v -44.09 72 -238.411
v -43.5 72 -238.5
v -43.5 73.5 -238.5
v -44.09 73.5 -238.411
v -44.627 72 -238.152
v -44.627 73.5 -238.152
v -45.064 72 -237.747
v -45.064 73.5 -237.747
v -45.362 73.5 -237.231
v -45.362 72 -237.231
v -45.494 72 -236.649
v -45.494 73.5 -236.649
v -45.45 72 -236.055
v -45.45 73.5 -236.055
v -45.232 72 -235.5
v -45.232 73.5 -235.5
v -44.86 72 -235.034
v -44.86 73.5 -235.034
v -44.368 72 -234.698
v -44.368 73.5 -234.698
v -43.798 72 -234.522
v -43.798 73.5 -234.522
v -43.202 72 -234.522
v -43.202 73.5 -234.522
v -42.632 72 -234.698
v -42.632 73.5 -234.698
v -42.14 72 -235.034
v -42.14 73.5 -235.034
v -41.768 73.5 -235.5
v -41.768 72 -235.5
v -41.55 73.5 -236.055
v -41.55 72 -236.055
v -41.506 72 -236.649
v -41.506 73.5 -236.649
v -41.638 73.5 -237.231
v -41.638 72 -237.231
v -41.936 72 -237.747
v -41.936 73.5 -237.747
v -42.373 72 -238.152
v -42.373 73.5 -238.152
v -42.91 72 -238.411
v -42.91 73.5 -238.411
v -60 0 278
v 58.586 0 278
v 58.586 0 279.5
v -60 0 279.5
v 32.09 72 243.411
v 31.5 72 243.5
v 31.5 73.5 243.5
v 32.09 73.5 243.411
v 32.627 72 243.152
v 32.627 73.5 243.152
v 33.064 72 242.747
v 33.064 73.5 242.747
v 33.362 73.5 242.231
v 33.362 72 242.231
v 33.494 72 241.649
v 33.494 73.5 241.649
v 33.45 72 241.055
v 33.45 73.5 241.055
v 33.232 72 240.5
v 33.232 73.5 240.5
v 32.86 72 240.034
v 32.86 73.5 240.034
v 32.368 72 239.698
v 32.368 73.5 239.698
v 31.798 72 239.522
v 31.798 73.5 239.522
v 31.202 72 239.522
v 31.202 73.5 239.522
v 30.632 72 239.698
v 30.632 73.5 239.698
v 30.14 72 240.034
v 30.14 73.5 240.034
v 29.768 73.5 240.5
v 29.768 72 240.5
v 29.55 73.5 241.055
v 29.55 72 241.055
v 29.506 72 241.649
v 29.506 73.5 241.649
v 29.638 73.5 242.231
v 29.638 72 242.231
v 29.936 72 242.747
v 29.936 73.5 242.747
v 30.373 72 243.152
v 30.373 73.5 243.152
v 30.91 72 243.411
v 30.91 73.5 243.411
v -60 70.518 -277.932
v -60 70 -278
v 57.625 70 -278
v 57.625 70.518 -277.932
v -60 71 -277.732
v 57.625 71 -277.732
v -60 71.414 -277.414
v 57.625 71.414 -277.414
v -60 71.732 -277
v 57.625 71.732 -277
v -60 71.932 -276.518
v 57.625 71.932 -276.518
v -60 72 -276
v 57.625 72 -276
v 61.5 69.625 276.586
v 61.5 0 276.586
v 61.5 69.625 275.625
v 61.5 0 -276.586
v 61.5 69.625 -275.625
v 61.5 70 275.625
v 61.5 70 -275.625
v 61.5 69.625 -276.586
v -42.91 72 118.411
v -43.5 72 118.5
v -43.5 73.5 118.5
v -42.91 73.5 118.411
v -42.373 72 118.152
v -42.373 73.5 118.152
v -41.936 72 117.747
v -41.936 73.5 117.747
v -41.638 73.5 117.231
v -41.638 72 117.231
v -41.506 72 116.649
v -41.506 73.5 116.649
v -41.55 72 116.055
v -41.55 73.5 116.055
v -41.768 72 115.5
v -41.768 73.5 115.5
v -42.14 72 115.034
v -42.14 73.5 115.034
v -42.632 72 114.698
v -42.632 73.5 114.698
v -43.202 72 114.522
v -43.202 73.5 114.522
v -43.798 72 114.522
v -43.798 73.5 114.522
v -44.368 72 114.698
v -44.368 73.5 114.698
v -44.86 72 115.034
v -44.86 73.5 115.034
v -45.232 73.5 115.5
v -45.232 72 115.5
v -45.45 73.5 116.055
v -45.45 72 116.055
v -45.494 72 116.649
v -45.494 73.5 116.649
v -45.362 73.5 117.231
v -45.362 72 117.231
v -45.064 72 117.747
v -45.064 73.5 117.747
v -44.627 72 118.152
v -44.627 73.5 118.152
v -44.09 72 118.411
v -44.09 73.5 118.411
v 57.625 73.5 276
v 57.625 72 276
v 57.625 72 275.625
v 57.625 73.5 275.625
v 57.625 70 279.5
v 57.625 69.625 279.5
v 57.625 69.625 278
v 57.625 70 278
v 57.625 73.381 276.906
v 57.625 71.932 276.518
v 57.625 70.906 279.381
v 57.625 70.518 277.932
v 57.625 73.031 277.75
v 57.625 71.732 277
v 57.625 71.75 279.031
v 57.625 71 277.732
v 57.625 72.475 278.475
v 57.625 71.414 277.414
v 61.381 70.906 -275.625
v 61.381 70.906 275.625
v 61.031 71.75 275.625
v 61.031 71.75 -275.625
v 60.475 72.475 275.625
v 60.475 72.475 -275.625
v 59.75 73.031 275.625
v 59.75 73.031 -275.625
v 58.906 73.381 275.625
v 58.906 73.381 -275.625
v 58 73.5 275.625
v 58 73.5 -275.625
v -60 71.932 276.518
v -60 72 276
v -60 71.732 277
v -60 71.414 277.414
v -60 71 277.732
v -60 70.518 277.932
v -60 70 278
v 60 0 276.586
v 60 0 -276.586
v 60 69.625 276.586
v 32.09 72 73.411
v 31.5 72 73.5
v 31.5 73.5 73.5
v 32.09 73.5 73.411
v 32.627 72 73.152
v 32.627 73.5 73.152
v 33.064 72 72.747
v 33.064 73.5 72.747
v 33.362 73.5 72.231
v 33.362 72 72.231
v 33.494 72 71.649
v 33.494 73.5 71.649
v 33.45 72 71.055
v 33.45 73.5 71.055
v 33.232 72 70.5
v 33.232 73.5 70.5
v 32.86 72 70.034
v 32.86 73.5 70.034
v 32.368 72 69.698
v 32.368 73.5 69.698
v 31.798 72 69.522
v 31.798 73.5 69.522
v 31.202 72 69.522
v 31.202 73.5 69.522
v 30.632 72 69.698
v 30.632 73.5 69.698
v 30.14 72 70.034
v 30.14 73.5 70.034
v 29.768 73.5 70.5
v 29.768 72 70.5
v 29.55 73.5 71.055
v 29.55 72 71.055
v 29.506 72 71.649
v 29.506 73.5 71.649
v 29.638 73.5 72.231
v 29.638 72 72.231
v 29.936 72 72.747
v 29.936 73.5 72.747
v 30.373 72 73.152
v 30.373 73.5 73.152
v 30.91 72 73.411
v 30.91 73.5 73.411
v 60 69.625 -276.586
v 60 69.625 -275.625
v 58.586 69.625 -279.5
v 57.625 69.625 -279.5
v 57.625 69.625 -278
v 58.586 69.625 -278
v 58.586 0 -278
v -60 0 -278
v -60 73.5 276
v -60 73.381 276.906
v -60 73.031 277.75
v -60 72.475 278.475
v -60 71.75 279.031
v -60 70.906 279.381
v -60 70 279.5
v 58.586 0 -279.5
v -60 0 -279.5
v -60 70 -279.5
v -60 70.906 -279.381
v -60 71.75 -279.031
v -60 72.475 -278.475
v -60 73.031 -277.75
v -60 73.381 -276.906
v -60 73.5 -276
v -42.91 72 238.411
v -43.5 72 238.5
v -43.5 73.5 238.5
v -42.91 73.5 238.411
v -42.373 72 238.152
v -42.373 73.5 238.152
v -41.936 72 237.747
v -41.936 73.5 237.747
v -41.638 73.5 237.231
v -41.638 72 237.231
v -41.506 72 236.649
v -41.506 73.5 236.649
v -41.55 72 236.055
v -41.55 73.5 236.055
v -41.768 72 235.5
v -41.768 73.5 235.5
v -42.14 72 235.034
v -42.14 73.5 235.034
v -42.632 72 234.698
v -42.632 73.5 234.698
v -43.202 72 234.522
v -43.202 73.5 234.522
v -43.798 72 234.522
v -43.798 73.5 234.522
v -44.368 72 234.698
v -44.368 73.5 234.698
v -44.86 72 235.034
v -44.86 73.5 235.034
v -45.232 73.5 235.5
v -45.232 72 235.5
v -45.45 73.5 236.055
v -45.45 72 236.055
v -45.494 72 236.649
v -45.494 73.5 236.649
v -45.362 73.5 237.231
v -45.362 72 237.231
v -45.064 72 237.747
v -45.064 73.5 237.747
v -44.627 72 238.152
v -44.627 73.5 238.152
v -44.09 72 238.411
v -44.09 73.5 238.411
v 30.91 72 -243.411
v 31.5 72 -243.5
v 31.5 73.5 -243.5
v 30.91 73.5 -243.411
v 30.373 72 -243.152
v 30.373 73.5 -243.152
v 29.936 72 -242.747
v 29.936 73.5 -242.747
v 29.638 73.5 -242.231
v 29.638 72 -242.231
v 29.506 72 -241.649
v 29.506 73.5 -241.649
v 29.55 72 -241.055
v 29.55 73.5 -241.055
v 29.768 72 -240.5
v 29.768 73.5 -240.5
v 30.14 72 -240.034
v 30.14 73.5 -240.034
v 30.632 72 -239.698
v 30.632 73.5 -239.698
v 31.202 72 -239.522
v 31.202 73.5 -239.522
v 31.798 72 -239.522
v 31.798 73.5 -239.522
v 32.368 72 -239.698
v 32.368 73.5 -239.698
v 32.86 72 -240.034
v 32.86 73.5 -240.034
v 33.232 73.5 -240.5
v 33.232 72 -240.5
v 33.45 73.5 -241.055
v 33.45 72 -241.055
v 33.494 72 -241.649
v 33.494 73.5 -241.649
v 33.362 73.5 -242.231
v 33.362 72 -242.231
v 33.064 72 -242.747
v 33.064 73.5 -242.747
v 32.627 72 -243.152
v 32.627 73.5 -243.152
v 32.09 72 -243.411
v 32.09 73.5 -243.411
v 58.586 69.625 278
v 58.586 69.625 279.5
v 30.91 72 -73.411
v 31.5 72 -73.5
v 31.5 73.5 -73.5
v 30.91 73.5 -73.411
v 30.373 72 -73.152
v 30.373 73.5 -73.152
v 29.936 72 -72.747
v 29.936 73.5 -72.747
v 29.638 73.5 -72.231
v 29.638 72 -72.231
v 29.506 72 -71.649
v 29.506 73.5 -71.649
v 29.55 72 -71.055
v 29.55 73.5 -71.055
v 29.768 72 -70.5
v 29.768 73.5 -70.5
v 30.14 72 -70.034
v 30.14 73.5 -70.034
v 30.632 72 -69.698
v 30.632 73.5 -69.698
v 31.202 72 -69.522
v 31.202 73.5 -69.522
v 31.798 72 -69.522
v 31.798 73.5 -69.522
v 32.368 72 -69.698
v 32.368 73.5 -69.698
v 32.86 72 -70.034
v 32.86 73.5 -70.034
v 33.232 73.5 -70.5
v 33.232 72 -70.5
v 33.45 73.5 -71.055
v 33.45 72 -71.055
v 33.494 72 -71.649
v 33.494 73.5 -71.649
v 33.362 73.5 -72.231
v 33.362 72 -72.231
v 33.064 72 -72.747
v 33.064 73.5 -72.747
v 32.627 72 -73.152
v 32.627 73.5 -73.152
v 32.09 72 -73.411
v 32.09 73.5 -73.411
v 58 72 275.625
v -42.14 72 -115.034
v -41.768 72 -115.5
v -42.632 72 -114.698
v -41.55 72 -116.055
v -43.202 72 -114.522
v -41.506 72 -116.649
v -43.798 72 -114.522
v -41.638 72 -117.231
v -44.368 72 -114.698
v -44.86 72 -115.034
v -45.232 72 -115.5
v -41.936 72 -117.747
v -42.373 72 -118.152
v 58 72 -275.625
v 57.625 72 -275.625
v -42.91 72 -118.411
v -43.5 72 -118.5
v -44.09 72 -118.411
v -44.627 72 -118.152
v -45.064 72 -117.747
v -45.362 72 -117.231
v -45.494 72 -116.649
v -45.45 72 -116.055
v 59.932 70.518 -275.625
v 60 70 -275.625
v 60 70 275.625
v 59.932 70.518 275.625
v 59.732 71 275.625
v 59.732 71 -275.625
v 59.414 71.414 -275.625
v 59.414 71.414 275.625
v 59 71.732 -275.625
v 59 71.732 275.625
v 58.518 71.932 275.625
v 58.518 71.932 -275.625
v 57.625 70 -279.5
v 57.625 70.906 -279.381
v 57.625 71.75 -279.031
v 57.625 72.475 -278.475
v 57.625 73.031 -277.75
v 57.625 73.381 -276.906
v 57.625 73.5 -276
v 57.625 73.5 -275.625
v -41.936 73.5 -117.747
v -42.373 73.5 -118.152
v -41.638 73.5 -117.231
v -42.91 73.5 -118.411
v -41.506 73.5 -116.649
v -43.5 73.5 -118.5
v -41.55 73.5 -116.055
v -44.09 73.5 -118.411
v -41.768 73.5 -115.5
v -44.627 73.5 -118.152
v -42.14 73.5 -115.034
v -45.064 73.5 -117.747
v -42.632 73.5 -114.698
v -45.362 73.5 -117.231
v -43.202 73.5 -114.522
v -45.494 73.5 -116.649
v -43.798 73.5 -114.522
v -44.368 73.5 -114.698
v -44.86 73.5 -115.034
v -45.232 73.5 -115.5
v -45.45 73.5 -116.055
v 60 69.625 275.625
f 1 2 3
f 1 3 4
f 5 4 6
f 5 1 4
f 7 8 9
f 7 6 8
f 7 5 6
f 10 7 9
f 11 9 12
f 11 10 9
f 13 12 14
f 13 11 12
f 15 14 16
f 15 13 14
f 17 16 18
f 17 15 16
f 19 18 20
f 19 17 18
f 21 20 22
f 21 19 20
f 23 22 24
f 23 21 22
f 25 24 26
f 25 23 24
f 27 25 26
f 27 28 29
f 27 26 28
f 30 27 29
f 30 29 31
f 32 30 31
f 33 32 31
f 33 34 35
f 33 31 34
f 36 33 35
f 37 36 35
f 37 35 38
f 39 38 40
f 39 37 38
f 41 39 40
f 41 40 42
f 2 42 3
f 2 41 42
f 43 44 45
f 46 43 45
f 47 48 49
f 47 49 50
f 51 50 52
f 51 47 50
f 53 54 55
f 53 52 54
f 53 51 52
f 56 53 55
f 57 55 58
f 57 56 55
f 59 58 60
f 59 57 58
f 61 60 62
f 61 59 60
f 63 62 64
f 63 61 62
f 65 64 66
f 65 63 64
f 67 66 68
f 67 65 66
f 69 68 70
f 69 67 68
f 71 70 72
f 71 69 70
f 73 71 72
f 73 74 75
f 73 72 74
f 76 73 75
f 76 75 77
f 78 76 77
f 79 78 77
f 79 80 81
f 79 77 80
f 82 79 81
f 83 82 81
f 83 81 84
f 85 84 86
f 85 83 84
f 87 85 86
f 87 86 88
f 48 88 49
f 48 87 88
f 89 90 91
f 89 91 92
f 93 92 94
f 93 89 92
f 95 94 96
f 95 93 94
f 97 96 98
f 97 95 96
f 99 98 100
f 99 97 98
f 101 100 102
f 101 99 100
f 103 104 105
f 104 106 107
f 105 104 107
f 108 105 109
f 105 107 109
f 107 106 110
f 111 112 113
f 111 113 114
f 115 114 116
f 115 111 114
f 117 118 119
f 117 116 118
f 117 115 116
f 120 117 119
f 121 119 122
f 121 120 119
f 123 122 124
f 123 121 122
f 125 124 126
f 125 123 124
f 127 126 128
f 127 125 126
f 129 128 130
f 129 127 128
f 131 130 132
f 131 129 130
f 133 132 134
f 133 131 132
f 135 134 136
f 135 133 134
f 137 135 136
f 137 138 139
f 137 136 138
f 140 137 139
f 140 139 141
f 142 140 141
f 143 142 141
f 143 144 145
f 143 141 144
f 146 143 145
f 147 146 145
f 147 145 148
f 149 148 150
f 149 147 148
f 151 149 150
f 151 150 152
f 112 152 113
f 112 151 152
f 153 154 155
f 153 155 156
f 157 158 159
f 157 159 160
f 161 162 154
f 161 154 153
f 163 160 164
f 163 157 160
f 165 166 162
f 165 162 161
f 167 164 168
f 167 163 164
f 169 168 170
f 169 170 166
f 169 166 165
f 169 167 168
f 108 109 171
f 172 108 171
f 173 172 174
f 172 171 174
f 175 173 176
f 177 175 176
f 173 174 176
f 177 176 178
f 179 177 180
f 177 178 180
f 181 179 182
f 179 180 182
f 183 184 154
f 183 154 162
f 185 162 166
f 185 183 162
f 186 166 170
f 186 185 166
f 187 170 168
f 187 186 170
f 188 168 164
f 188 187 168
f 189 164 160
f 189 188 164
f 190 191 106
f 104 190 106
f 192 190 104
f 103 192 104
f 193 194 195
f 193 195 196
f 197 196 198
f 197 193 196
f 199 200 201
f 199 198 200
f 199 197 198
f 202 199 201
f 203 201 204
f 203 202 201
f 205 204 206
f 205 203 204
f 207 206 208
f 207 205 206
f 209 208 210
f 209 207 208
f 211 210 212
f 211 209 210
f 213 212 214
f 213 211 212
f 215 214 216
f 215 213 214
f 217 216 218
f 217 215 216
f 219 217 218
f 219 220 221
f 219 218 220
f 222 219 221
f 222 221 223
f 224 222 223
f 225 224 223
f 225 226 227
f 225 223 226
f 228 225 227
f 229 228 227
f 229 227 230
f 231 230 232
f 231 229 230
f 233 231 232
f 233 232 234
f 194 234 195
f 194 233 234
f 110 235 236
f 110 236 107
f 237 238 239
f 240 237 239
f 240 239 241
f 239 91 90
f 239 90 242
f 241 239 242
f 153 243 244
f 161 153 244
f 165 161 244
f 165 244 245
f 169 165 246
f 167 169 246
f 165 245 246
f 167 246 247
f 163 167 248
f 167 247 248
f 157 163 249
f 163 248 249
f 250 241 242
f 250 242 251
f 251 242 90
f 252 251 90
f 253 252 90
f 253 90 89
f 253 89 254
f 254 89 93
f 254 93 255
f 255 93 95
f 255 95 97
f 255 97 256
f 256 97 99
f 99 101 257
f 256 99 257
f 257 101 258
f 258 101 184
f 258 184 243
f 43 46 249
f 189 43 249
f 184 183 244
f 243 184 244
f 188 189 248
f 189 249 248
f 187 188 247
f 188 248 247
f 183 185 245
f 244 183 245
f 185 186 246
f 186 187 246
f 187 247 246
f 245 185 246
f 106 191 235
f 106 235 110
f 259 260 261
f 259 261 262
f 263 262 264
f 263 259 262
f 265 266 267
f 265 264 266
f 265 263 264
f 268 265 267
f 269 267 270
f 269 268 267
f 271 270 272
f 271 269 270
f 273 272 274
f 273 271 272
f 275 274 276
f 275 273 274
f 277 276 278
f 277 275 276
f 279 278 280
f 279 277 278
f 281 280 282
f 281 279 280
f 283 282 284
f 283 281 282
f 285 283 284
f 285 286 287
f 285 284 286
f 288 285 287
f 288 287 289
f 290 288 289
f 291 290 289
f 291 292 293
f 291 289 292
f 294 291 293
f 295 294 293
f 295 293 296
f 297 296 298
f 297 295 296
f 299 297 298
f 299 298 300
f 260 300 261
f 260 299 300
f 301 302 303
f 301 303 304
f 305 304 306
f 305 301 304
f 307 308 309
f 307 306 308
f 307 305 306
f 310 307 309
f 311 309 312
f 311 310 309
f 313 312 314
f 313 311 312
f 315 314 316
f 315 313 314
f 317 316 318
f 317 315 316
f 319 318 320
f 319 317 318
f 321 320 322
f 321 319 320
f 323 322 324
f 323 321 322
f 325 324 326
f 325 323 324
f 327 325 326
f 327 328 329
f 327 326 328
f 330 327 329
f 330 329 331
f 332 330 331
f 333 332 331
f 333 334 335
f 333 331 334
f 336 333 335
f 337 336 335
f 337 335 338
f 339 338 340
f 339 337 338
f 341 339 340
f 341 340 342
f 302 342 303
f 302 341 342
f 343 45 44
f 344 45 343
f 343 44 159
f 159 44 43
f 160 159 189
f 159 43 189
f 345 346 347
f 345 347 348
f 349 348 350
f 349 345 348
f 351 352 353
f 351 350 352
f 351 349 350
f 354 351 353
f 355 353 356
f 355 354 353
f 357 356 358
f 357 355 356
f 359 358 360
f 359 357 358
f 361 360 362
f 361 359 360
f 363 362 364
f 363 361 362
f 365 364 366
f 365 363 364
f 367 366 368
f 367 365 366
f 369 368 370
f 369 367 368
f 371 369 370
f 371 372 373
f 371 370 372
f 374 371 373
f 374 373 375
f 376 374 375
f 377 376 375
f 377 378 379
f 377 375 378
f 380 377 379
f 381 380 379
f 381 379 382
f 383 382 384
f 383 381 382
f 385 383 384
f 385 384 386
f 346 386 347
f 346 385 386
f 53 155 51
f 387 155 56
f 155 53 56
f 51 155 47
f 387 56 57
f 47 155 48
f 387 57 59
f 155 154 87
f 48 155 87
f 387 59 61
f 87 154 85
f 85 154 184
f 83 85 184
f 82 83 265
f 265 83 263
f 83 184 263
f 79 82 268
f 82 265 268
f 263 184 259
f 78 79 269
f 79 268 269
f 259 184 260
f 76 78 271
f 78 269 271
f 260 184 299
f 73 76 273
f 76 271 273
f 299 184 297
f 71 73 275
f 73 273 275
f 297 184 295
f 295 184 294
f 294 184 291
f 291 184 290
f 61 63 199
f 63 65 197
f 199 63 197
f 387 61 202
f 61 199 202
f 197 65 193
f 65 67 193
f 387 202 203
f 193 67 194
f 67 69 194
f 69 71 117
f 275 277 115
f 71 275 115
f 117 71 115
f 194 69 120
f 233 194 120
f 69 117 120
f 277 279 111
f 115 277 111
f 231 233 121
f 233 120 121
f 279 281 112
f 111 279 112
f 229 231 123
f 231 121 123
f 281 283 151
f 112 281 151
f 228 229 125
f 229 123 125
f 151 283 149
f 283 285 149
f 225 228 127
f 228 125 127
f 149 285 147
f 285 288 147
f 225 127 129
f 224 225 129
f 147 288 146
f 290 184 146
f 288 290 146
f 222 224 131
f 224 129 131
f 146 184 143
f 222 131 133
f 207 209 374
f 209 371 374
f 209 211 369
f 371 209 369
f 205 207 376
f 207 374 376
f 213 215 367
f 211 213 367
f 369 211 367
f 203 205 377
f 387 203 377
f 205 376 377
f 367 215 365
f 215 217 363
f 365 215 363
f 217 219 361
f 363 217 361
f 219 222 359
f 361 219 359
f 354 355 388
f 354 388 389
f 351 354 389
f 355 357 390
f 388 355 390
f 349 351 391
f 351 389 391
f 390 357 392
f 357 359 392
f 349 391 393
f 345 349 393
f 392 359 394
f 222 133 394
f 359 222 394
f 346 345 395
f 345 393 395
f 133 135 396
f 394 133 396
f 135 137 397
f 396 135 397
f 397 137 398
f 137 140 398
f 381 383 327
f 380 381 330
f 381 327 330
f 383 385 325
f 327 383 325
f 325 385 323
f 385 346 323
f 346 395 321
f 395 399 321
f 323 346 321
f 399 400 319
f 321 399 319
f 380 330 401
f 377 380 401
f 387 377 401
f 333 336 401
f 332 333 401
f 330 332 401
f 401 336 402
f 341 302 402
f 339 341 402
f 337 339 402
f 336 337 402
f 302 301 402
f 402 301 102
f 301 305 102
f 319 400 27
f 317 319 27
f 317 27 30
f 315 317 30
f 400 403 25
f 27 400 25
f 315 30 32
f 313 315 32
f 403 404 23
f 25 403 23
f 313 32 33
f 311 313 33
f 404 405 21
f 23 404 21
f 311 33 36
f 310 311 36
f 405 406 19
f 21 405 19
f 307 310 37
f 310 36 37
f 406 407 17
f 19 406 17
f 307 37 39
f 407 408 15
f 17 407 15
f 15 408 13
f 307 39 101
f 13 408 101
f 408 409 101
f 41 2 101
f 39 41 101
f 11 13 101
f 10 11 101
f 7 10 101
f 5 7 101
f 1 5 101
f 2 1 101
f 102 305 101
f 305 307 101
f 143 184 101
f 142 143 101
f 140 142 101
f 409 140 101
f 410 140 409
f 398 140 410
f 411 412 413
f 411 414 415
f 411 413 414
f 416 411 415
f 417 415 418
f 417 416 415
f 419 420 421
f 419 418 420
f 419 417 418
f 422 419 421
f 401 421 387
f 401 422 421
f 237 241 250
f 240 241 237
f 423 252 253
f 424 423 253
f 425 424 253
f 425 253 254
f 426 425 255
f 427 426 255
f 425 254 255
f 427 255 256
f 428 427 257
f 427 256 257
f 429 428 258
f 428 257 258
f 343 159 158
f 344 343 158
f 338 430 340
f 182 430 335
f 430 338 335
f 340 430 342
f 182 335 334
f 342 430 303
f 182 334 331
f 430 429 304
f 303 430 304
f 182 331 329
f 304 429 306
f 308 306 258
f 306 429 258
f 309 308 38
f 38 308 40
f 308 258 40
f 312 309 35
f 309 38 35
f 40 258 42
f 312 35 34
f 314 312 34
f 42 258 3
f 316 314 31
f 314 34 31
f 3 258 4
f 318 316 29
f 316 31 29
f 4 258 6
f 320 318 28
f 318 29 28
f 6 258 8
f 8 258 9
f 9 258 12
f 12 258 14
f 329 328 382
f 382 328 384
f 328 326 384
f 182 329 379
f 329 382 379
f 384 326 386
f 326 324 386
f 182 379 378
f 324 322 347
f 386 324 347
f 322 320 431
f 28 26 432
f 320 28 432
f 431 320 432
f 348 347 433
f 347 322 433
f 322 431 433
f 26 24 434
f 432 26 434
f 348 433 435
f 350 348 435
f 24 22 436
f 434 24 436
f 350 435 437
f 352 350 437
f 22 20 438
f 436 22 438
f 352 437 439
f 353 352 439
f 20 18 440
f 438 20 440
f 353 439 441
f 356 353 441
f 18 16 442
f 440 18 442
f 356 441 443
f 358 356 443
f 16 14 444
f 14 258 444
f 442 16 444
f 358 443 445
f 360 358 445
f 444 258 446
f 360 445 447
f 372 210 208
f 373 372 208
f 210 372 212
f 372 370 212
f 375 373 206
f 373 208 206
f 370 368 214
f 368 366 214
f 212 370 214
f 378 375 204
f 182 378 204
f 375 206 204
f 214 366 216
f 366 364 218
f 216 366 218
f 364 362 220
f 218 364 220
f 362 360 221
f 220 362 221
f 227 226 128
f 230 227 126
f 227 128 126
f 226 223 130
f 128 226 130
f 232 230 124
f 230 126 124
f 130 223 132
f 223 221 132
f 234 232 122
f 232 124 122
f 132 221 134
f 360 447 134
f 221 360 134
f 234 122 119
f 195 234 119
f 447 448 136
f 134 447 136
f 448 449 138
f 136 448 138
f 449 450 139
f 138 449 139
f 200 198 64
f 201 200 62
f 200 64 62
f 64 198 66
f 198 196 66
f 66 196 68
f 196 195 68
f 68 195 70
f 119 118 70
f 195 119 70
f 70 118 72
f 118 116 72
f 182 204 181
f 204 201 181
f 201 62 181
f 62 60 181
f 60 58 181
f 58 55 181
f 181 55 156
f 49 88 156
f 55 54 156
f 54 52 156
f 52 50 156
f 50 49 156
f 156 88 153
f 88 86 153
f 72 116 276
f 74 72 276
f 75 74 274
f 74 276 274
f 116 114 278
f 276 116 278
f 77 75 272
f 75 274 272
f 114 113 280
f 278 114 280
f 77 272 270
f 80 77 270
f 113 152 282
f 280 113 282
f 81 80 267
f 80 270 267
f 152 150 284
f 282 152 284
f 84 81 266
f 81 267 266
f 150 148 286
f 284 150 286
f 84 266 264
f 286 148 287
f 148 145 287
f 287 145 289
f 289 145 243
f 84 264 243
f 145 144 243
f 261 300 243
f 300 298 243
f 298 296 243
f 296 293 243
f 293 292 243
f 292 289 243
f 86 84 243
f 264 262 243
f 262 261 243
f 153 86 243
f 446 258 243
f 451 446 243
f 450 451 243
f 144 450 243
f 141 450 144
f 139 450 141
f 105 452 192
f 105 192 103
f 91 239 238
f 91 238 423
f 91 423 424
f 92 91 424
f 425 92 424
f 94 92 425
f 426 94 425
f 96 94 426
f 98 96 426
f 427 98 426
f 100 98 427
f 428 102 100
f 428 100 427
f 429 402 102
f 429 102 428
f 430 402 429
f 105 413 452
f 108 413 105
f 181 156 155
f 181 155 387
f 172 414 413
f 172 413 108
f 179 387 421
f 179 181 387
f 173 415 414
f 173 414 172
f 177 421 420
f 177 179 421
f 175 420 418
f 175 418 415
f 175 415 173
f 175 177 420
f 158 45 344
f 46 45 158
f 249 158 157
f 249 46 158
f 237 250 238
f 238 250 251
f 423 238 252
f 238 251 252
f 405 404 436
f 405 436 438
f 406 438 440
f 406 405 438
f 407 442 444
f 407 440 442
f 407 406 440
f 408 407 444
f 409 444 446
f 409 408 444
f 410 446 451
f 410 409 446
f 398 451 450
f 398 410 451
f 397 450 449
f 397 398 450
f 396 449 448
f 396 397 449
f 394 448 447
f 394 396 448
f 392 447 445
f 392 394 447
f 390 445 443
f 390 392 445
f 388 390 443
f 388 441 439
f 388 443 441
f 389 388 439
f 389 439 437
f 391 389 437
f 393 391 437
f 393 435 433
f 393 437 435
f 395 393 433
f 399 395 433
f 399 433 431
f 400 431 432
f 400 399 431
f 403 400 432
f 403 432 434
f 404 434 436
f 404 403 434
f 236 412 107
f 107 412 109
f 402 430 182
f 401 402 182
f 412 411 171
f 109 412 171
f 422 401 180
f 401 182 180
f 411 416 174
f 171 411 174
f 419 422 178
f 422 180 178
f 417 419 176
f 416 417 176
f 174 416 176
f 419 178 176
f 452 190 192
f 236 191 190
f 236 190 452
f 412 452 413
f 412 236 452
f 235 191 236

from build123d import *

# Parameters (mm, degrees)
SKETCH_1_W                  = 120
SKETCH_1_H                  = 556
EXTRUDE_1_DEPTH             = 72
SHEET_START                 = 58.585786438
SHEET_METAL_1_DEPTH         = 2.914213562
SHEET_START_2               = -60
SHEET_METAL_1_2_DEPTH       = 118
SHEET_START_3               = 57.625
SHEET_METAL_1_3_DEPTH       = 0.960786438
SHEET_METAL_1_4_DEPTH       = 117.625
SHEET_METAL_1_5_OUTLINE_W   = 69.625
SHEET_METAL_1_5_OUTLINE_H   = 1.5
SHEET_METAL_1_5_OUTLINE_W_2 = 1.5
SHEET_METAL_1_5_OUTLINE_H_2 = 551.25
SHEET_METAL_1_5_DEPTH       = 0.375
SHEET_METAL_1_6_OUTLINE_W   = 69.625
SHEET_METAL_1_6_OUTLINE_H   = 1.5
SHEET_METAL_1_6_DEPTH       = 0.960786438
SHEET_START_4               = -276.585786438
SHEET_METAL_1_7_DEPTH       = 553.171572876
SHEET_START_5               = -275.625
SHEET_METAL_1_8_DEPTH       = 551.25
SHEET_METAL_1_9_OUTLINE_W   = 1.5
SHEET_METAL_1_9_OUTLINE_H   = 69.625
SHEET_METAL_1_9_DEPTH       = 553.171572876
SKETCH_6_R                  = 2
CUT_EXTRUDE_1_DEPTH         = 296.473772102


with BuildPart() as part:
    # Sketch 1 → 凸台-拉伸1 (new body)
    with BuildSketch(Plane(origin=(0, 0, 0), x_dir=(1, 0, 0), z_dir=(0, 1, 0))):
        Rectangle(SKETCH_1_W, SKETCH_1_H)
    extrude(amount=EXTRUDE_1_DEPTH)

    # Sheet Metal 1: read off the stored shape, not the designer's step
    # Sheet Metal 1 outline → Sheet Metal 1 (cut)
    with BuildSketch(Plane.YZ.offset(SHEET_START)):
        with BuildLine():
            Line((0, 279.5), (0, 276.585786438))
            Line((0, 276.585786438), (69.625, 276.585786438))
            Line((69.625, 276.585786438), (69.625, 275.625))
            Line((69.625, 275.625), (73.5, 275.625))
            Line((73.5, 275.625), (73.5, 276))
            ThreePointArc((73.5, 276), (72.474873734, 278.474873734), (70, 279.5))
            Line((70, 279.5), (69.625, 279.5))
            Line((69.625, 279.5), (0, 279.5))
        make_face()
        with BuildLine():
            Line((69.625, -276.585786438), (0, -276.585786438))
            Line((0, -276.585786438), (0, -279.5))
            Line((0, -279.5), (69.625, -279.5))
            Line((69.625, -279.5), (70, -279.5))
            ThreePointArc((70, -279.5), (72.474873734, -278.474873734), (73.5, -276))
            Line((73.5, -276), (73.5, -275.625))
            Line((73.5, -275.625), (69.625, -275.625))
            Line((69.625, -275.625), (69.625, -276.585786438))
        make_face()
    extrude(amount=SHEET_METAL_1_DEPTH, mode=Mode.SUBTRACT)

    # Sheet Metal 1 2 outline → Sheet Metal 1 2 (cut)
    with BuildSketch(Plane.YZ.offset(SHEET_START_2)):
        with BuildLine():
            Line((0, 278), (0, -278))
            Line((0, -278), (70, -278))
            ThreePointArc((70, -278), (71.414213562, -277.414213562), (72, -276))
            Line((72, -276), (72, 276))
            ThreePointArc((72, 276), (71.414213562, 277.414213562), (70, 278))
            Line((70, 278), (0, 278))
        make_face()
    extrude(amount=SHEET_METAL_1_2_DEPTH, mode=Mode.SUBTRACT)

    # Sheet Metal 1 3 outline → Sheet Metal 1 3 (cut)
    with BuildSketch(Plane.YZ.offset(SHEET_START_3)):
        Polygon((0, 278), (0, 276.585786438), (69.625, 276.585786438), (69.625, 275.625), (72, 275.625), (72, 278), align=None)
        Polygon((69.625, -276.585786438), (0, -276.585786438), (0, -278), (72, -278), (72, -275.625), (69.625, -275.625), align=None)
    extrude(amount=SHEET_METAL_1_3_DEPTH, mode=Mode.SUBTRACT)

    # Sheet Metal 1 4 outline → Sheet Metal 1 4 (add)
    with BuildSketch(Plane.YZ.offset(SHEET_START_2)):
        with BuildLine():
            Line((0, 279.5), (0, 278))
            Line((0, 278), (72, 278))
            Line((72, 278), (72, -278))
            Line((72, -278), (0, -278))
            Line((0, -278), (0, -279.5))
            Line((0, -279.5), (70, -279.5))
            ThreePointArc((70, -279.5), (72.474873734, -278.474873734), (73.5, -276))
            Line((73.5, -276), (73.5, 276))
            ThreePointArc((73.5, 276), (72.474873734, 278.474873734), (70, 279.5))
            Line((70, 279.5), (0, 279.5))
        make_face()
    extrude(amount=SHEET_METAL_1_4_DEPTH)

    # Sheet Metal 1 5 outline → Sheet Metal 1 5 (add)
    with BuildSketch(Plane.YZ.offset(SHEET_START_3)):
        with Locations((34.8125, 278.75)):
            Rectangle(SHEET_METAL_1_5_OUTLINE_W, SHEET_METAL_1_5_OUTLINE_H)
        with Locations((34.8125, -278.75)):
            Rectangle(SHEET_METAL_1_5_OUTLINE_W, SHEET_METAL_1_5_OUTLINE_H)
        with Locations((72.75, 0)):
            Rectangle(SHEET_METAL_1_5_OUTLINE_W_2, SHEET_METAL_1_5_OUTLINE_H_2)
    extrude(amount=SHEET_METAL_1_5_DEPTH)

    # Sheet Metal 1 6 outline → Sheet Metal 1 6 (add)
    with BuildSketch(Plane.YZ.offset(SHEET_START_3)):
        with Locations((34.8125, 278.75)):
            Rectangle(SHEET_METAL_1_6_OUTLINE_W, SHEET_METAL_1_6_OUTLINE_H)
        with Locations((34.8125, -278.75)):
            Rectangle(SHEET_METAL_1_6_OUTLINE_W, SHEET_METAL_1_6_OUTLINE_H)
    extrude(amount=SHEET_METAL_1_6_DEPTH)

    # Sheet Metal 1 7 outline → Sheet Metal 1 7 (cut)
    with BuildSketch(Plane.XY.offset(SHEET_START_4)):
        with BuildLine():
            Line((58, 0), (60, 0))
            Line((60, 0), (60, 70))
            ThreePointArc((60, 70), (59.414213562, 71.414213562), (58, 72))
            Line((58, 72), (58, 0))
        make_face()
    extrude(amount=SHEET_METAL_1_7_DEPTH, mode=Mode.SUBTRACT)

    # Sheet Metal 1 8 outline → Sheet Metal 1 8 (add)
    with BuildSketch(Plane.XY.offset(SHEET_START_5)):
        with BuildLine():
            Line((60, 0), (61.5, 0))
            Line((61.5, 0), (61.5, 70))
            ThreePointArc((61.5, 70), (60.474873734, 72.474873734), (58, 73.5))
            Line((58, 73.5), (58, 72))
            Line((58, 72), (60, 72))
            Line((60, 72), (60, 0))
        make_face()
    extrude(amount=SHEET_METAL_1_8_DEPTH)

    # Sheet Metal 1 9 outline → Sheet Metal 1 9 (add)
    with BuildSketch(Plane.XY.offset(SHEET_START_4)):
        with Locations((60.75, 34.8125)):
            Rectangle(SHEET_METAL_1_9_OUTLINE_W, SHEET_METAL_1_9_OUTLINE_H)
    extrude(amount=SHEET_METAL_1_9_DEPTH)

    # 草图6 → 切除-拉伸1 (cut, through all)
    with BuildSketch(Plane(origin=(0, 0, 0), x_dir=(1, 0, 0), z_dir=(0, 1, 0))):
        with Locations(Location((-43.5, -236.5, 0), (0, 0, 270))):
            Circle(SKETCH_6_R)
        with Locations(Location((31.5, -241.5, 0), (0, 0, 270))):
            Circle(SKETCH_6_R)
        with Locations(Location((-43.5, -116.5, 0), (0, 0, 270))):
            Circle(SKETCH_6_R)
        with Locations(Location((31.5, -71.5, 0), (0, 0, 270))):
            Circle(SKETCH_6_R)
        with Locations(Location((31.5, 71.5, 0), (0, 0, 90))):
            Circle(SKETCH_6_R)
        with Locations(Location((-43.5, 116.5, 0), (0, 0, 90))):
            Circle(SKETCH_6_R)
        with Locations(Location((31.5, 241.5, 0), (0, 0, 90))):
            Circle(SKETCH_6_R)
        with Locations(Location((-43.5, 236.5, 0), (0, 0, 90))):
            Circle(SKETCH_6_R)
    extrude(amount=CUT_EXTRUDE_1_DEPTH, mode=Mode.SUBTRACT)


solid = part.part
